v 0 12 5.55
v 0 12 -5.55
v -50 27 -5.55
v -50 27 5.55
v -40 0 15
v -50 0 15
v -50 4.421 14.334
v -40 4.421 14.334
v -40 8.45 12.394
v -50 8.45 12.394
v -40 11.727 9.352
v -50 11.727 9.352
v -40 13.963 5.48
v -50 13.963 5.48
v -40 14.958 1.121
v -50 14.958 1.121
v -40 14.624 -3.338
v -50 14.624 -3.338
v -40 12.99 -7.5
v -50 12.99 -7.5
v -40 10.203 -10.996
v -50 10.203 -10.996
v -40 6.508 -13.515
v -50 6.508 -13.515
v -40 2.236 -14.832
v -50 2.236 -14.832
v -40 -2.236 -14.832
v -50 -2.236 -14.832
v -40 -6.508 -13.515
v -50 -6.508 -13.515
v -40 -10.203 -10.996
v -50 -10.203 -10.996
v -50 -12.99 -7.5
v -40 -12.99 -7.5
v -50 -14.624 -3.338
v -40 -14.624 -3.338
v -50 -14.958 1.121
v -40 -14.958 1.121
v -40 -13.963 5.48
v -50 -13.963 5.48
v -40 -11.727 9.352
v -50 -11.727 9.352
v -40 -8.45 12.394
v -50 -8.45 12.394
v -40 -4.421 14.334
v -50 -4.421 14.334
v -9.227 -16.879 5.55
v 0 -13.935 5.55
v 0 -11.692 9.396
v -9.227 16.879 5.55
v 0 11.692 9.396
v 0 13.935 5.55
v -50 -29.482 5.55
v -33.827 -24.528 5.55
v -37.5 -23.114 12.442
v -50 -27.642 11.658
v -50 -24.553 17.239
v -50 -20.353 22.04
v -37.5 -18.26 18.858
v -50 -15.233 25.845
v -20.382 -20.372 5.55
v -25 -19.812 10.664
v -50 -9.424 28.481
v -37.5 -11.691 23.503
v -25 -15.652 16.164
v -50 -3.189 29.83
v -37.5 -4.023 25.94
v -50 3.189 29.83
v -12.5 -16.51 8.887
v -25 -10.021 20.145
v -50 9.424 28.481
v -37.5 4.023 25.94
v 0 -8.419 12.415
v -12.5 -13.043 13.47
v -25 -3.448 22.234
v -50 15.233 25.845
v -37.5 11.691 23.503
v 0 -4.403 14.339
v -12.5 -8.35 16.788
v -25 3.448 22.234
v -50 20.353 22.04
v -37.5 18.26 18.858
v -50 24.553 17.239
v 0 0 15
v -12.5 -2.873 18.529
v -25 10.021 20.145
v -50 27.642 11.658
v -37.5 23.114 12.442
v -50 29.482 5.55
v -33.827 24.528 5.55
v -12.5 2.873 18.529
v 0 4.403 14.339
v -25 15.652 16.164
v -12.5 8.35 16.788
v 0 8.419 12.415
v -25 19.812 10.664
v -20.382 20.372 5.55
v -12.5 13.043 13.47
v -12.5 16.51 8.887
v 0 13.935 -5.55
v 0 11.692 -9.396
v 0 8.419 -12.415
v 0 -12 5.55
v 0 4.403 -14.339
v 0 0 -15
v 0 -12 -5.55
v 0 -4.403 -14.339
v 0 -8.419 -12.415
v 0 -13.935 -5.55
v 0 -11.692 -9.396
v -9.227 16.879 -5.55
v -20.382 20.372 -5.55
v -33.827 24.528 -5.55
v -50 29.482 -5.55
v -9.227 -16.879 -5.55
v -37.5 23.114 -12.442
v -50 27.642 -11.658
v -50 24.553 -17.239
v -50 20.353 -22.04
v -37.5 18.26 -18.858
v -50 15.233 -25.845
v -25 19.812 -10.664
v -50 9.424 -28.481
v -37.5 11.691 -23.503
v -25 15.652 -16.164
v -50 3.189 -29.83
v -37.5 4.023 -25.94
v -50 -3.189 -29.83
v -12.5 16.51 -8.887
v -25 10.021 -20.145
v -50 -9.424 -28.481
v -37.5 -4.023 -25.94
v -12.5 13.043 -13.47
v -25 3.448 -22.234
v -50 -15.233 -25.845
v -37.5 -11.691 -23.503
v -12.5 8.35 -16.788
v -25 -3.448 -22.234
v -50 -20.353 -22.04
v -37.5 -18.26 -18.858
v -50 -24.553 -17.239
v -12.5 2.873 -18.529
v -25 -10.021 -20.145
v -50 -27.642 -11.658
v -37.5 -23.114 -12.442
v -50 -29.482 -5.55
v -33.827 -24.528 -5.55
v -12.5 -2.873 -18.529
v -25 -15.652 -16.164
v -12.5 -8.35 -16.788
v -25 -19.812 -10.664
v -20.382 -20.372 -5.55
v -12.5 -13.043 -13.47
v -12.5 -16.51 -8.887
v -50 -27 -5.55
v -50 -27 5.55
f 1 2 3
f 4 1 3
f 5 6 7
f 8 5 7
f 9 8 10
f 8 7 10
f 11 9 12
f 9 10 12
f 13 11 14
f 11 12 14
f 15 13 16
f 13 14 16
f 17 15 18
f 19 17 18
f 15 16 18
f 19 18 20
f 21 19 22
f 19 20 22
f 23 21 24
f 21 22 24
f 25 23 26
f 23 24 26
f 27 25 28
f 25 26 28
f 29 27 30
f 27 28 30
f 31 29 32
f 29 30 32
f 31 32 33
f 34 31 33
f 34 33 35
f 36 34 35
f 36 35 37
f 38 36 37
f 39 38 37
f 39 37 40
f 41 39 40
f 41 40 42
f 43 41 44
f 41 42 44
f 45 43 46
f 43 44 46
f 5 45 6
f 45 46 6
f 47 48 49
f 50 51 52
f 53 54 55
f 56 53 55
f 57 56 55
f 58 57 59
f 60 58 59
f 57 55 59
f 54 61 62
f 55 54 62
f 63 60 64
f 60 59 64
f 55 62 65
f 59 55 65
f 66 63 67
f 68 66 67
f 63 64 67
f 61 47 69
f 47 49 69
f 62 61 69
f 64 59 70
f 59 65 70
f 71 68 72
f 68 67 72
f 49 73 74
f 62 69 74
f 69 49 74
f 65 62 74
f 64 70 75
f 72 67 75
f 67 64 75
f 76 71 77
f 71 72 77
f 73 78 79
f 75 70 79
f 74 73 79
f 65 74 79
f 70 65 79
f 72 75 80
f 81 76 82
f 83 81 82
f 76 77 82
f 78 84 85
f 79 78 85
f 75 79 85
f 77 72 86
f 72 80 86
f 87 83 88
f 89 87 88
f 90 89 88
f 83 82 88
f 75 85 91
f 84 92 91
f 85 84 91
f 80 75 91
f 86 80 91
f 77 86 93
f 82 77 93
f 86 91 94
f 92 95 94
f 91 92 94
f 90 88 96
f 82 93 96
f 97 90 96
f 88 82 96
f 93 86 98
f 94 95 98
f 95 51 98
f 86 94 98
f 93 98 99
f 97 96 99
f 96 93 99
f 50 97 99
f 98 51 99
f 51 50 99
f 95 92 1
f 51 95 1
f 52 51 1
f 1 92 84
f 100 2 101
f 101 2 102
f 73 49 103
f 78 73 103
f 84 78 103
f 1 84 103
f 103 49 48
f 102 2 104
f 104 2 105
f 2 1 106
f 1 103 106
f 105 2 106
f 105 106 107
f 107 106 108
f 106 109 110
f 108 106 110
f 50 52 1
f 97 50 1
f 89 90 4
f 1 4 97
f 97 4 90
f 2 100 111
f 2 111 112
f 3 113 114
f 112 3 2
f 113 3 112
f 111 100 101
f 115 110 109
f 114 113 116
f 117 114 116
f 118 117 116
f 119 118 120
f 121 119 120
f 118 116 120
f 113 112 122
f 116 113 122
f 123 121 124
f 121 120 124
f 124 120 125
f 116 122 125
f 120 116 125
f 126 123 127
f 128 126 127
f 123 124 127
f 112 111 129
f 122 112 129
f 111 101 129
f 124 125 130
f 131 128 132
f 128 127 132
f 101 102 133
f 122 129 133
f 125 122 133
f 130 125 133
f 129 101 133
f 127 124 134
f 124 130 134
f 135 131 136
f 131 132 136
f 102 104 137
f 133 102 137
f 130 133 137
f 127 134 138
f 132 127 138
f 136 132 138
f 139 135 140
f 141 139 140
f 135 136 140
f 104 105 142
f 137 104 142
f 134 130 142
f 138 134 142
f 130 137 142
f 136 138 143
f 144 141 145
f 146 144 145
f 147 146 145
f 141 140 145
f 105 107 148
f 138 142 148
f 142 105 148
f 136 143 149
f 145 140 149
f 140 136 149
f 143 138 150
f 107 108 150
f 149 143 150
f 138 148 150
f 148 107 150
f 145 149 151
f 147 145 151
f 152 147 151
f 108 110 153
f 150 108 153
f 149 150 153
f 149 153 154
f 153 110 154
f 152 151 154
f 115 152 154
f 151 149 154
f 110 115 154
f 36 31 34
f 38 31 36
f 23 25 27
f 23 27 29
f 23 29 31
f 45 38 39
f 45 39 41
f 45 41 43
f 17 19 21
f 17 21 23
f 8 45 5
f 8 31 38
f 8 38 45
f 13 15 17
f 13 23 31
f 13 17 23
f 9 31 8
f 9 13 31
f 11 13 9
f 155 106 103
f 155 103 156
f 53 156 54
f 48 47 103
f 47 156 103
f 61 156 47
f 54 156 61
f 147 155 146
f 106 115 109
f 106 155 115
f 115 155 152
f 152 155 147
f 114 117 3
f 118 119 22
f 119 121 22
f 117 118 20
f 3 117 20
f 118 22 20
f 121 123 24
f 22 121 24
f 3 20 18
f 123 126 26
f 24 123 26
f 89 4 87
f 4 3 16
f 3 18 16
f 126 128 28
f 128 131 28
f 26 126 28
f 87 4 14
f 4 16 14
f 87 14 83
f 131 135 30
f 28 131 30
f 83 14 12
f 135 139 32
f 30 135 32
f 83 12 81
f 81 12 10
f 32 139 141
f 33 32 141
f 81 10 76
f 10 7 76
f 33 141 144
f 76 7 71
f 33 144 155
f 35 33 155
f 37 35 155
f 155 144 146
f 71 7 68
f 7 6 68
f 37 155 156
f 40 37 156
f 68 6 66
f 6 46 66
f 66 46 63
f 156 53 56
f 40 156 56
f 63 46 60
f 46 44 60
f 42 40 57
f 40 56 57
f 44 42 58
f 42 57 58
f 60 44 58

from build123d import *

# Parameters (mm, degrees)
SKETCH2_R               = 15
CUT_EXTRUDE1_DEPTH      = 10
CUT_EXTRUDE2_DEPTH      = 5.55
CUT_EXTRUDE2_DEPTH_BACK = 5.55


with BuildPart() as part:
    # Sketch1 → Revolve1 (revolve)
    with BuildSketch(Plane.XY):
        Polygon((0, 0), (-50, 0), (-50, 30), (0, 15), align=None)
    revolve(axis=Axis((0, 0, 0), (-1, 0, 0)))

    # Sketch2 → Cut-Extrude1 (cut)
    with BuildSketch(Plane.ZY.offset(50)):
        Circle(SKETCH2_R)
    extrude(amount=-CUT_EXTRUDE1_DEPTH, mode=Mode.SUBTRACT)

    # Sketch4 → Cut-Extrude2 (cut, two sides: drawn at the far end of the back side and taken through both)
    with BuildSketch(Plane.XY.offset(-CUT_EXTRUDE2_DEPTH_BACK)):
        Polygon((0, 15), (0, 12), (-50, 27), (-50, 30), align=None)
        Polygon((0, -15), (0, -12), (-50, -27), (-50, -30), align=None)
    extrude(amount=CUT_EXTRUDE2_DEPTH + CUT_EXTRUDE2_DEPTH_BACK, mode=Mode.SUBTRACT)


solid = part.part
